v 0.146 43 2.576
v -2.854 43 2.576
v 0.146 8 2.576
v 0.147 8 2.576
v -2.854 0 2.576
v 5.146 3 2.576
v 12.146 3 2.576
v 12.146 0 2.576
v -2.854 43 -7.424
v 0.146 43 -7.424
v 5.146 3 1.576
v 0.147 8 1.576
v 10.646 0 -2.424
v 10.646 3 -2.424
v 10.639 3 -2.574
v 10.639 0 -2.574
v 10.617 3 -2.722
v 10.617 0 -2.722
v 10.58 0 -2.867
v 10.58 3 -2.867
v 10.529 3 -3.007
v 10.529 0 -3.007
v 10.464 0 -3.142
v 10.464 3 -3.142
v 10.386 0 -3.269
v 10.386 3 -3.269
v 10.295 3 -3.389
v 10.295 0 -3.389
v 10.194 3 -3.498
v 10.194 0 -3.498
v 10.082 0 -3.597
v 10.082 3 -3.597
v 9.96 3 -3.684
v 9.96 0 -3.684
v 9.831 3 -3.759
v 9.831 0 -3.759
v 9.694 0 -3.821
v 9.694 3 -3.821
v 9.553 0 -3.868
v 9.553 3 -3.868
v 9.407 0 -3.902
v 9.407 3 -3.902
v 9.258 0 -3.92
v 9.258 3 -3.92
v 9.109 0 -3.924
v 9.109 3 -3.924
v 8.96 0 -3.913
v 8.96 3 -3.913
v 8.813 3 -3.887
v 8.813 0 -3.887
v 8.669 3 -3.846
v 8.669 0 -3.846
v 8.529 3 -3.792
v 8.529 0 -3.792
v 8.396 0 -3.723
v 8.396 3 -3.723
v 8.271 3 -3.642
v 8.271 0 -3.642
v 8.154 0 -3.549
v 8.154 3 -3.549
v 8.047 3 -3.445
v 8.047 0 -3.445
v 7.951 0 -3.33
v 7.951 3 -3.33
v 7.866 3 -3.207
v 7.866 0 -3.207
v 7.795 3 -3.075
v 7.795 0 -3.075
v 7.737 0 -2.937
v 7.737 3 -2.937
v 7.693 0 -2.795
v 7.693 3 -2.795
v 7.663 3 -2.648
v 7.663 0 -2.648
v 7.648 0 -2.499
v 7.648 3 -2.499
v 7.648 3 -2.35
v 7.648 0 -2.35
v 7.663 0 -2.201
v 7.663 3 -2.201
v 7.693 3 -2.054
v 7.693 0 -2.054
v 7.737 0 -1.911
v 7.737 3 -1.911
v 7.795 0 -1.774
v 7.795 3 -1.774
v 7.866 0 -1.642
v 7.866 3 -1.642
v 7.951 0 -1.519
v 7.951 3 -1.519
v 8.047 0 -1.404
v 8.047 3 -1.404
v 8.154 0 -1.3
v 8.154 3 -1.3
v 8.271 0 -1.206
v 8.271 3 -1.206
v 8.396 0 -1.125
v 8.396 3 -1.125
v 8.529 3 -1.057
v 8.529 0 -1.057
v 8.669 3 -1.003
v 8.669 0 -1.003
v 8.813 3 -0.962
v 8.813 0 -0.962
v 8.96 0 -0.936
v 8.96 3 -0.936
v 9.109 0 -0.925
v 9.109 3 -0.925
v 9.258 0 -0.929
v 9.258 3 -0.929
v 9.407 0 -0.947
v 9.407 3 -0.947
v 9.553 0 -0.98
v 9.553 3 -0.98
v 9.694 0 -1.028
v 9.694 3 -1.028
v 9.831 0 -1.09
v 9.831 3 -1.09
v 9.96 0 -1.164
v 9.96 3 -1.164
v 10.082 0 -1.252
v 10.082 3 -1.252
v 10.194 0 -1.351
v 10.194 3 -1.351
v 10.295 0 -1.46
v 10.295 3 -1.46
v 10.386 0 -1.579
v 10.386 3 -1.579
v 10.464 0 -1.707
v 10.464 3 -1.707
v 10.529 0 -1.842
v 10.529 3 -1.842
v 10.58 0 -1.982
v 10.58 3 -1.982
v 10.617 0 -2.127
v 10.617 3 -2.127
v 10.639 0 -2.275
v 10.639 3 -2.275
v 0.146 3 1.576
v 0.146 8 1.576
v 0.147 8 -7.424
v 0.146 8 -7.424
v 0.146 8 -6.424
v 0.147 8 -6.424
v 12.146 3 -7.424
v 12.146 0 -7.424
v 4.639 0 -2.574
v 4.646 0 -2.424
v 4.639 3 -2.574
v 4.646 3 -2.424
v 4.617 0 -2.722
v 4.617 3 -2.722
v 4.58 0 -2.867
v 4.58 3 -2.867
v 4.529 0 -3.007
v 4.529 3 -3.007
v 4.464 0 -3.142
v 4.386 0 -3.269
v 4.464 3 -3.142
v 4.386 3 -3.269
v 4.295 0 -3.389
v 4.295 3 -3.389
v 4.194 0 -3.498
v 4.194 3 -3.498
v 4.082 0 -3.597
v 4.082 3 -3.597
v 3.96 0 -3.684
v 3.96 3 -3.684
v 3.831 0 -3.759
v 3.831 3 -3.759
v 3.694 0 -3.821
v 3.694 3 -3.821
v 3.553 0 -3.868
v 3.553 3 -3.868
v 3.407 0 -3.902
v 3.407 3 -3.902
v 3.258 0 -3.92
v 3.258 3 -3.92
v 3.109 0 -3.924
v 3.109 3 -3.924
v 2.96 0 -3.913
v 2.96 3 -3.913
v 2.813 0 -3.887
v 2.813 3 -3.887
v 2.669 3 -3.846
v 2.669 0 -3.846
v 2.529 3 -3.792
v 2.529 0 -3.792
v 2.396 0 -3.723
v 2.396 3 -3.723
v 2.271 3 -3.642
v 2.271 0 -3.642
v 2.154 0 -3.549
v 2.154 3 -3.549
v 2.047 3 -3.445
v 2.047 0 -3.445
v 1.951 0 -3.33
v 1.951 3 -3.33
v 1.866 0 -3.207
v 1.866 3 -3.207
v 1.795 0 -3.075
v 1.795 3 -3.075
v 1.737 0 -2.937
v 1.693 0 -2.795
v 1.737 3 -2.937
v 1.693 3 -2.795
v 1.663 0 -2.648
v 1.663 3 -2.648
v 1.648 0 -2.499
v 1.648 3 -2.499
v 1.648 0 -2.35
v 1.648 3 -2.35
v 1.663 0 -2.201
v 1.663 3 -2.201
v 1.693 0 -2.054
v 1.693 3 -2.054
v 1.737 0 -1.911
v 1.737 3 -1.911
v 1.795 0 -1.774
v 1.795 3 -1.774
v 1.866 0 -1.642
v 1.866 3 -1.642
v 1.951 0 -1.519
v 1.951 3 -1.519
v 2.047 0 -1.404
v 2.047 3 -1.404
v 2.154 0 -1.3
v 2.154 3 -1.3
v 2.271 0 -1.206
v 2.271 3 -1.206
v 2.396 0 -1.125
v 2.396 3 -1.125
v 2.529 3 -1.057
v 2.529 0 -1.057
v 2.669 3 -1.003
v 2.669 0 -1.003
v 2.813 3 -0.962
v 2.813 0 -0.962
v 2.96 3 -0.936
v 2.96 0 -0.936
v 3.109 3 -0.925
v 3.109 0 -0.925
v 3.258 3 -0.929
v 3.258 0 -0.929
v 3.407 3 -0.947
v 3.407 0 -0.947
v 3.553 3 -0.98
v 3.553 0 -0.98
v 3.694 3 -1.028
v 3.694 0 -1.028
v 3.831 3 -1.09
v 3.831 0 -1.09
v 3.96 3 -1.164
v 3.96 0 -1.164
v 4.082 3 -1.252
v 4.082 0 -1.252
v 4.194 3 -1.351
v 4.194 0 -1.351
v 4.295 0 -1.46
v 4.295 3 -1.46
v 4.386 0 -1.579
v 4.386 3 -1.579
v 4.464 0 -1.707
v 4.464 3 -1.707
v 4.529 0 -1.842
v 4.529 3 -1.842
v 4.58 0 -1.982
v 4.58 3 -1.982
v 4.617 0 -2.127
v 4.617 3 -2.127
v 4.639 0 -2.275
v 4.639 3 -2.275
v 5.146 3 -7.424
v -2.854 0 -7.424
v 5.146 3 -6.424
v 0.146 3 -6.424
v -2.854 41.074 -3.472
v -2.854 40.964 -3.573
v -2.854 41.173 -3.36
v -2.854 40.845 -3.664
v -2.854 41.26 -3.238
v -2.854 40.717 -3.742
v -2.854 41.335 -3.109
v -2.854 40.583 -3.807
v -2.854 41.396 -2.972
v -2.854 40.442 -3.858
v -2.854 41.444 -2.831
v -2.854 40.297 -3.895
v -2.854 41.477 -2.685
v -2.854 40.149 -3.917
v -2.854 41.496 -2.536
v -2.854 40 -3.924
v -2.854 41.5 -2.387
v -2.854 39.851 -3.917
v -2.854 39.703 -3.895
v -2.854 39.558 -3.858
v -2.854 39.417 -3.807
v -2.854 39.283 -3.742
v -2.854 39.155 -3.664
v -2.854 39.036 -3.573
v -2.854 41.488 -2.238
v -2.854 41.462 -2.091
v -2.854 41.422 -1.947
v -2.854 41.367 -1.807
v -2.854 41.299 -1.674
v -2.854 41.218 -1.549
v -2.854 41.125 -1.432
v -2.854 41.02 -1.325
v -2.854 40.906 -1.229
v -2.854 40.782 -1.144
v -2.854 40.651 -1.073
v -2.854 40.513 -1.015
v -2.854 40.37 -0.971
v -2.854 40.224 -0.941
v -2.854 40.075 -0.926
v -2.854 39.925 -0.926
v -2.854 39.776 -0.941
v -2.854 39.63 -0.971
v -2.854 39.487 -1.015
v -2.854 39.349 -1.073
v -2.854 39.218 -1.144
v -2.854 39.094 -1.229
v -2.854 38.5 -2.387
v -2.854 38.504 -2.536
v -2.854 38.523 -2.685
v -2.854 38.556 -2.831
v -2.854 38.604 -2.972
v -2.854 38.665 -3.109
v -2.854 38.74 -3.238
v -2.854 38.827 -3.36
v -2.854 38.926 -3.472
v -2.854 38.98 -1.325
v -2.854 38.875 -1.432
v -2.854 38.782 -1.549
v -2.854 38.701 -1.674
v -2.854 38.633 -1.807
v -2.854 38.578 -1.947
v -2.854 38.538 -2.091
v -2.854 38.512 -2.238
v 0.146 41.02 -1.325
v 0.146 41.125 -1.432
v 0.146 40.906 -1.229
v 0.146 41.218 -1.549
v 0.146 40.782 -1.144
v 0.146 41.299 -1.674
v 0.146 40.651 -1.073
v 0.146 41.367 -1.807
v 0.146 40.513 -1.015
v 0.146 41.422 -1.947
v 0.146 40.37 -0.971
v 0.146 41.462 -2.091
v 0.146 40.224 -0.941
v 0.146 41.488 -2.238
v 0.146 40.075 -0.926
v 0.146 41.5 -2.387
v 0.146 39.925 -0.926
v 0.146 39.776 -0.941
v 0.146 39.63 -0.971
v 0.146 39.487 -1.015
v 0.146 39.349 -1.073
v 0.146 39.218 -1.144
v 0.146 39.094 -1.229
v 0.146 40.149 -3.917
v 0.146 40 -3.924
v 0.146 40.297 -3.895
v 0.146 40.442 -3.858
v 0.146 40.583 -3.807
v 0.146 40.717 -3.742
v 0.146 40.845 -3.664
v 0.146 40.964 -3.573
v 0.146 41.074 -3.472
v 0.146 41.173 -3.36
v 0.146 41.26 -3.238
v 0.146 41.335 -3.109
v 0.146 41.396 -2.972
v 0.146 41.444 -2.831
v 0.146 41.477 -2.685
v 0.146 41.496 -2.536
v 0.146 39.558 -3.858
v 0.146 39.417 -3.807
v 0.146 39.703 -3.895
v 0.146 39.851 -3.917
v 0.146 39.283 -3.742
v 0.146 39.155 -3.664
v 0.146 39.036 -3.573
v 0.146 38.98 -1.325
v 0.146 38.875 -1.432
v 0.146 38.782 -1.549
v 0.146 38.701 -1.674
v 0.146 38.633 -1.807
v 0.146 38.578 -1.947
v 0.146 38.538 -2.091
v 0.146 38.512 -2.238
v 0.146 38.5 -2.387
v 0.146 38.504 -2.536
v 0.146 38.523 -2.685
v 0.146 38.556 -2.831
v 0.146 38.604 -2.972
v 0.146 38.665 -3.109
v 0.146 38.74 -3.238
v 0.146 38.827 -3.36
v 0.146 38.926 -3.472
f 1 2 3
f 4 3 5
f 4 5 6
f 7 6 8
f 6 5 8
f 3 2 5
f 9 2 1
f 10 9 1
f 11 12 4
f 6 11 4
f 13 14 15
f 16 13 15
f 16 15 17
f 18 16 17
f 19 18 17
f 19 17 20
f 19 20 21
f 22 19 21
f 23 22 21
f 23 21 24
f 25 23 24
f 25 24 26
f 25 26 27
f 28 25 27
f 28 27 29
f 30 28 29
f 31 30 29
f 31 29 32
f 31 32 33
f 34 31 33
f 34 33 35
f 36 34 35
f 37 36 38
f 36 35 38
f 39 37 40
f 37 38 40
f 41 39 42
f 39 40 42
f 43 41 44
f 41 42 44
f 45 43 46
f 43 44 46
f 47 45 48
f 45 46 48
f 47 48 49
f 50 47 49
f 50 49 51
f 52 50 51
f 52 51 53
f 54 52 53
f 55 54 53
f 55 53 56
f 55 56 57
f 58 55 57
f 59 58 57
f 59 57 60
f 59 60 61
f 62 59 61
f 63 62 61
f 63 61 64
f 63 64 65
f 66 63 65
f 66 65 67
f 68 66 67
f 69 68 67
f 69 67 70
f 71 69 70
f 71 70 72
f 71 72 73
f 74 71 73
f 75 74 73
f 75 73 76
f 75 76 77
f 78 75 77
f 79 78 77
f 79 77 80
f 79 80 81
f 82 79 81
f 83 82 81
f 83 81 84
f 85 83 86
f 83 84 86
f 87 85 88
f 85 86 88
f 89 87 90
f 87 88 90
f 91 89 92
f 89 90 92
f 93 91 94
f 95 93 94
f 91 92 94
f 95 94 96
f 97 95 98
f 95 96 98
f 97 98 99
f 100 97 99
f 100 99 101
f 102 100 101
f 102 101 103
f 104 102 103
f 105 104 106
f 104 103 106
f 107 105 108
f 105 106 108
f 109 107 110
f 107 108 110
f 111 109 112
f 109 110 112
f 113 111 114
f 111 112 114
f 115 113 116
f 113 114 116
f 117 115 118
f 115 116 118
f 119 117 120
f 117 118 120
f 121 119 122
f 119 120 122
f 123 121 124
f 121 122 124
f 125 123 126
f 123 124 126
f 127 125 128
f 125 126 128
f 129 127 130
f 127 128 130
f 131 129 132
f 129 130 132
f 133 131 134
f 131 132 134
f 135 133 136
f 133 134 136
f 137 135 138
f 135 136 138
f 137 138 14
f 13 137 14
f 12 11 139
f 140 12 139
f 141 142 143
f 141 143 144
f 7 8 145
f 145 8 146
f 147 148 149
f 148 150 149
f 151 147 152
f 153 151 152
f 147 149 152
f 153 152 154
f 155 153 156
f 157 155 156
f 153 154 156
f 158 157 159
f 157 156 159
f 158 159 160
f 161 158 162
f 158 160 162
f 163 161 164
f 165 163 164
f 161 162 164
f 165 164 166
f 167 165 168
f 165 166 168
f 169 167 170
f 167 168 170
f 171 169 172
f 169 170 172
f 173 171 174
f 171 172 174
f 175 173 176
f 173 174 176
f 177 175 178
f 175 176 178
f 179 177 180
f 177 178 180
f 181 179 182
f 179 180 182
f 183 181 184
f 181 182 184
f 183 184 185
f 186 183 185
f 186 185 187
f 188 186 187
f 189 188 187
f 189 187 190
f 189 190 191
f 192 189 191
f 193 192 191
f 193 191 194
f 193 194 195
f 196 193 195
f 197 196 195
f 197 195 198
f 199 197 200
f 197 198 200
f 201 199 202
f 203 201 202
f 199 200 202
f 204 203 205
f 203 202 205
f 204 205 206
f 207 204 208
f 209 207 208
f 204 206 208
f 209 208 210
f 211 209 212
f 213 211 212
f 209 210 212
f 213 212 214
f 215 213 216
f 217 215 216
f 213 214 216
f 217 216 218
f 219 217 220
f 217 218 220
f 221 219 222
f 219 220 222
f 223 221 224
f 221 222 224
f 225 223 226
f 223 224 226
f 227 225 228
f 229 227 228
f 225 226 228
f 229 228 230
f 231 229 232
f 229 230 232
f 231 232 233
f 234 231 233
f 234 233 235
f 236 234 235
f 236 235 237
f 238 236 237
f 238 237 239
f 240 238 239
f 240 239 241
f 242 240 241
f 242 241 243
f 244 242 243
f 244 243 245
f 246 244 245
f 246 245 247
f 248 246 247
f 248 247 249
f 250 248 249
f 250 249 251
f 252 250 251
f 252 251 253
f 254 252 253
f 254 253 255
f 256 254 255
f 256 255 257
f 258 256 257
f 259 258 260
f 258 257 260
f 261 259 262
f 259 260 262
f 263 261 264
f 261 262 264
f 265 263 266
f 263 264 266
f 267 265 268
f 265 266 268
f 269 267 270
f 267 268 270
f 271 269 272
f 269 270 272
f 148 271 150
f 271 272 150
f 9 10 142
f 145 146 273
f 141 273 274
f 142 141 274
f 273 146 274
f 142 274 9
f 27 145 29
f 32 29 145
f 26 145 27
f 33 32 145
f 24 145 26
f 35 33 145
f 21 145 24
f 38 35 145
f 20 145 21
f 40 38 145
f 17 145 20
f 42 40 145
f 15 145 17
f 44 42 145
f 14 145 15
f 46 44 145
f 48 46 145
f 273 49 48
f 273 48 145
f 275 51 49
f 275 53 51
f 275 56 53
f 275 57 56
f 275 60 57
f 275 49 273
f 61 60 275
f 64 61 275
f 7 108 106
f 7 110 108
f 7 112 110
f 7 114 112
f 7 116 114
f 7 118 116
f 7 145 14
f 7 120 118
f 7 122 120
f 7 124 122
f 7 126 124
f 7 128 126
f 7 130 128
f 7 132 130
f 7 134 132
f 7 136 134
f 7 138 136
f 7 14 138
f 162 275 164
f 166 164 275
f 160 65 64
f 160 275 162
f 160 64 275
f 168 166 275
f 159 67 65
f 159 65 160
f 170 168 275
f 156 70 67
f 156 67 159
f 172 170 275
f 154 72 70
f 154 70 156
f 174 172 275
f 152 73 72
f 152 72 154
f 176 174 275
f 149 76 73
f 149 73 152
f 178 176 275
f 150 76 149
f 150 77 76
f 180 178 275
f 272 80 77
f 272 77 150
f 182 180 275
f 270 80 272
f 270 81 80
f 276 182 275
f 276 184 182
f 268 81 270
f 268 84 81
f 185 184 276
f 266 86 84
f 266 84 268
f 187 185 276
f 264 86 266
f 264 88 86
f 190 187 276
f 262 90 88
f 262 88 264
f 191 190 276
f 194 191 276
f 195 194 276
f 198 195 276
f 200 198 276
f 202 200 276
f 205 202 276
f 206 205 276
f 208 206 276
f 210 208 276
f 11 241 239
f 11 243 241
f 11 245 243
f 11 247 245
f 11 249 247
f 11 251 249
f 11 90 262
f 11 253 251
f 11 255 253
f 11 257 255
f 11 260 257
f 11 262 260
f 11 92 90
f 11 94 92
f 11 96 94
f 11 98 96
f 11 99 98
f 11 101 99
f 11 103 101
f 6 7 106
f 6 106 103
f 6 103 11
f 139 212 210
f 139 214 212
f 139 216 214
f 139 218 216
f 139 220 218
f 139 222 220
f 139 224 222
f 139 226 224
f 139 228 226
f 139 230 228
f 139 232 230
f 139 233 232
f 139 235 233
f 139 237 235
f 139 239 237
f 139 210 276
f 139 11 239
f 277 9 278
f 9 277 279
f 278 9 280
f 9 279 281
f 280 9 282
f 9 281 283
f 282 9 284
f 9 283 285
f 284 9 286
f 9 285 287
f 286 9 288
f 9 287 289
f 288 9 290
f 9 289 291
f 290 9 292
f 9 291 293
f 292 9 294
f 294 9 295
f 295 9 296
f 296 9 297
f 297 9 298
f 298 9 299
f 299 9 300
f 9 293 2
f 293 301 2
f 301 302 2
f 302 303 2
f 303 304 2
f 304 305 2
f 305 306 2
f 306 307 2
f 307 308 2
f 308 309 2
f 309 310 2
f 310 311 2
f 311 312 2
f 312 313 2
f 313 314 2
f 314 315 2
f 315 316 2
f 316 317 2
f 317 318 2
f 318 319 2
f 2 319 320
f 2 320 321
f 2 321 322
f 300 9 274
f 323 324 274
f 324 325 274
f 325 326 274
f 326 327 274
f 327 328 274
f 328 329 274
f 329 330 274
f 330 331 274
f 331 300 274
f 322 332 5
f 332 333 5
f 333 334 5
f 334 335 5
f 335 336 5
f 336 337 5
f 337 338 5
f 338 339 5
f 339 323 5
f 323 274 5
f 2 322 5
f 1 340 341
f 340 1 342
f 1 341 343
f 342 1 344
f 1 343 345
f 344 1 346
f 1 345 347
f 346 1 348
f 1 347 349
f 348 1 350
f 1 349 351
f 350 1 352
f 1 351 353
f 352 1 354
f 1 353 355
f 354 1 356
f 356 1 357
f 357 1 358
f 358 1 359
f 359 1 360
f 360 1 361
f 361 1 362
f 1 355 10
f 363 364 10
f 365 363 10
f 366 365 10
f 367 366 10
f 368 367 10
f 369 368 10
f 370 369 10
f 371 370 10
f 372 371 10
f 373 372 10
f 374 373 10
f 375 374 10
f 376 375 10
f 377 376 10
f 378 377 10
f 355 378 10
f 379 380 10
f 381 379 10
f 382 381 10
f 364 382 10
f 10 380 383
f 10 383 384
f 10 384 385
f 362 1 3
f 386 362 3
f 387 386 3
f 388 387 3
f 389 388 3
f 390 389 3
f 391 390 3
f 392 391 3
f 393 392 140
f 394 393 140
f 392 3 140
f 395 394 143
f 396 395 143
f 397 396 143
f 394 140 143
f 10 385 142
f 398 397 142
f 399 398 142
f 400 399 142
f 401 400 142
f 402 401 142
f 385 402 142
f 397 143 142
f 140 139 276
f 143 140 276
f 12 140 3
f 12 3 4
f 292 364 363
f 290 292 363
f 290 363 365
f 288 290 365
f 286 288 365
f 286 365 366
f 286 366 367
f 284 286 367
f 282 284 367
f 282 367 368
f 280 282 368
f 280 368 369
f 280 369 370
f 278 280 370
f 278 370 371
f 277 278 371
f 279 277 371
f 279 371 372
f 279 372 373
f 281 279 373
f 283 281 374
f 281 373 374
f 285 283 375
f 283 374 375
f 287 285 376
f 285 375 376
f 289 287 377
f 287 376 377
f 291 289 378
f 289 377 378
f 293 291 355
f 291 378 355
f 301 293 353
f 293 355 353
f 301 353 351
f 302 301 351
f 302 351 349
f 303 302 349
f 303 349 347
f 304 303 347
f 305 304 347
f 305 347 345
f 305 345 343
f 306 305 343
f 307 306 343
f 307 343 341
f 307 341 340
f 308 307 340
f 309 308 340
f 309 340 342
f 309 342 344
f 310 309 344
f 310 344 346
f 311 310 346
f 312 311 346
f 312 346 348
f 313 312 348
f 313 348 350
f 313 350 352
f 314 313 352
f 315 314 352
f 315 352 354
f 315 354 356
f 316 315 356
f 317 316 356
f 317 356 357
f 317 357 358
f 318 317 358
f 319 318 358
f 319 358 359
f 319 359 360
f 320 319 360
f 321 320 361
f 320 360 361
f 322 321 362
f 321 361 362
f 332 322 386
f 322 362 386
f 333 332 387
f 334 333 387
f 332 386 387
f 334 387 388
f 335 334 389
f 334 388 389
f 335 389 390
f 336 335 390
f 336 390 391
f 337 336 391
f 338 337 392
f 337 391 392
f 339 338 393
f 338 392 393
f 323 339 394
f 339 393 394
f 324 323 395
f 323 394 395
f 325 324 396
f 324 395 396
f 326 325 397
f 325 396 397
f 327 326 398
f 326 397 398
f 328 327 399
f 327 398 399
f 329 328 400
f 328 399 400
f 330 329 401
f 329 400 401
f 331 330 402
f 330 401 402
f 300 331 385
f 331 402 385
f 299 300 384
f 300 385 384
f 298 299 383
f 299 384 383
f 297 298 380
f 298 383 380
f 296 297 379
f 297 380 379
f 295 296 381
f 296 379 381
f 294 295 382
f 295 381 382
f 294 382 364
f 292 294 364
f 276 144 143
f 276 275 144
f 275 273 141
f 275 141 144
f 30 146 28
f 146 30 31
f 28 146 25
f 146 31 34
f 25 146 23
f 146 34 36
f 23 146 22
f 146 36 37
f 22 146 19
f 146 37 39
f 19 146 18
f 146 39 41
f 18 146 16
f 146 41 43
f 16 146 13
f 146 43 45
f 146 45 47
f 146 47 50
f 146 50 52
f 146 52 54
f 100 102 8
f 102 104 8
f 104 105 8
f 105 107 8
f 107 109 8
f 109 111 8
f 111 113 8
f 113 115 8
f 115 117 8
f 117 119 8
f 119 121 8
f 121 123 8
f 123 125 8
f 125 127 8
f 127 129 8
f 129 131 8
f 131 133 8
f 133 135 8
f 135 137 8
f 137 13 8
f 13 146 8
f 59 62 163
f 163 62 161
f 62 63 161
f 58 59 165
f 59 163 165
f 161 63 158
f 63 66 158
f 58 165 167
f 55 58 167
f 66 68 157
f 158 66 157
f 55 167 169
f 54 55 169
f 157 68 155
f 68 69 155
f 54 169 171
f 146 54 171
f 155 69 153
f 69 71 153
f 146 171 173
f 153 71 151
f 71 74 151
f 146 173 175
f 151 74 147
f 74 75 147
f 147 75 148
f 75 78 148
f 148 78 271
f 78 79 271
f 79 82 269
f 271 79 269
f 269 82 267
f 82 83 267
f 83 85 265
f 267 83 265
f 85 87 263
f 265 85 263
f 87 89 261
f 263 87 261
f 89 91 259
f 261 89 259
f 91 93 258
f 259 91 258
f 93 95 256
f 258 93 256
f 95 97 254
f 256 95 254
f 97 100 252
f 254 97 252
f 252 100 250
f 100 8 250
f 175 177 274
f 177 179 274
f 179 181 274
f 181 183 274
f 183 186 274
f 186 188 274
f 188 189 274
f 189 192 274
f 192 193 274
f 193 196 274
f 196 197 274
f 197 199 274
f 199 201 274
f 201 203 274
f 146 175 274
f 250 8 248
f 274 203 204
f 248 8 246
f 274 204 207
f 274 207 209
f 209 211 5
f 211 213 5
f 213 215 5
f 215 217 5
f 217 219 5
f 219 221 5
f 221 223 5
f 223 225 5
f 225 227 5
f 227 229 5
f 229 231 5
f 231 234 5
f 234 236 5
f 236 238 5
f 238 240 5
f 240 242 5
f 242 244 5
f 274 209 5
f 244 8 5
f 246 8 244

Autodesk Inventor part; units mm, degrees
ref_plane "YZ Plane" through (0, 0, 0) normal (1, 0, 0) x (0, 1, 0)
ref_plane "XZ Plane" through (0, 0, 0) normal (0, 1, 0) x (-1, 0, 0)
ref_plane "XY Plane" through (0, 0, 0) normal (0, 0, 1) x (1, 0, 0)
sketch "Esquisse1" plane through (0, 0, 0) normal (0, 1, 0) x (-1, 0, 0)
  line L0 (2.8537, 2.5756) -> (-12.1463, 2.5756)
  line L1 (-12.1463, 2.5756) -> (-12.1463, -7.4244)
  line L2 (-12.1463, -7.4244) -> (2.8537, -7.4244)
  line L3 (2.8537, -7.4244) -> (2.8537, 2.5756)
  point P0 (0, 0)
  dimension "d0" = 10
  dimension "d1" = 15
extrude "Extrusion1" add sketch "Esquisse1" along normal blind 3
sketch "Esquisse2" plane through (0, 3, 0) normal (0, 1, 0) x (1, 0, 0)
  line L0 (-2.8537, 7.4244) -> (-2.8537, -2.5756) projected
  line L1 (12.1463, 7.4244) -> (-2.8537, 7.4244) projected
  line L2 (-2.8537, -2.5756) -> (0.1463, -2.5756)
  line L3 (0.1463, -2.5756) -> (0.1463, 7.4244)
  line L4 (0.1463, 7.4244) -> (-2.8537, 7.4244)
  line L5 (-2.8537, 7.4244) -> (-2.8537, -2.5756)
  point P0 (0, 0)
  dimension "d4" = 3
extrude "Extrusion2" add sketch "Esquisse2" along normal blind 40
sketch "Esquisse3" plane through (0, 3, 0) normal (0, 1, 0) x (1, 0, 0)
  circle A0 centre (3.1463, 2.4244) radius 1.5
  circle A1 centre (9.1463, 2.4244) radius 1.5
  line L0 (12.1463, -2.5756) -> (12.1463, 7.4244) projected
  line L1 (0.1463, -2.5756) -> (12.1463, -2.5756) projected
  line L2 (0.1463, -2.5756) -> (0.1463, 7.4244) projected
  point P0 (0, 0)
  dimension "d7" = 3
  dimension "d8" = 3
  dimension "d9" = 3
  dimension "d10" = 5
  dimension "d11" = 5
  dimension "d12" = 3
extrude "Extrusion3" cut sketch "Esquisse3" against normal through all
sketch "Esquisse4" plane through (0, 3, 0) normal (0, 1, 0) x (1, 0, 0)
  line L0 (0.1463, -2.5756) -> (12.1463, -2.5756) projected
  line L1 (0.1463, -2.5756) -> (5.1463, -2.5756)
  line L2 (5.1463, -2.5756) -> (5.1463, -1.5756)
  line L3 (5.1463, -1.5756) -> (0.1463, -1.5756)
  line L4 (0.1463, -1.5756) -> (0.1463, -2.5756)
  line L5 (12.1463, 7.4244) -> (0.1463, 7.4244) projected
  line L6 (0.1463, 7.4244) -> (5.1463, 7.4244)
  line L7 (5.1463, 7.4244) -> (5.1463, 6.4244)
  line L8 (5.1463, 6.4244) -> (0.1463, 6.4244)
  line L9 (0.1463, 6.4244) -> (0.1463, 7.4244)
  point P0 (0, 0)
  dimension "d15" = 1
  dimension "d16" = 1
  dimension "d17" = 5
extrude "Extrusion4" add sketch "Esquisse4" along normal blind 5
chamfer "Chanfrein1" distance 5 angle 45 1 edges at (5.1463, 8, 2.0756)
chamfer "Chanfrein2" distance 5 angle 45 1 edges at (5.1463, 8, -6.9244)
sketch "Esquisse5" plane through (0.1463, 43, 2.5756) normal (1, 0, 0) x (0, 0, -1)
  circle A0 centre (5, -3) radius 1.5
  line L0 (0, -35) -> (0, 0) projected
  line L1 (0, 0) -> (10, 0) projected
  point P0 (2.5756, -43)
  dimension "d26" = 3
  dimension "d27" = 5
  dimension "d28" = 3
extrude "Extrusion5" cut sketch "Esquisse5" against normal through all
properties part number "equerre-bras"
